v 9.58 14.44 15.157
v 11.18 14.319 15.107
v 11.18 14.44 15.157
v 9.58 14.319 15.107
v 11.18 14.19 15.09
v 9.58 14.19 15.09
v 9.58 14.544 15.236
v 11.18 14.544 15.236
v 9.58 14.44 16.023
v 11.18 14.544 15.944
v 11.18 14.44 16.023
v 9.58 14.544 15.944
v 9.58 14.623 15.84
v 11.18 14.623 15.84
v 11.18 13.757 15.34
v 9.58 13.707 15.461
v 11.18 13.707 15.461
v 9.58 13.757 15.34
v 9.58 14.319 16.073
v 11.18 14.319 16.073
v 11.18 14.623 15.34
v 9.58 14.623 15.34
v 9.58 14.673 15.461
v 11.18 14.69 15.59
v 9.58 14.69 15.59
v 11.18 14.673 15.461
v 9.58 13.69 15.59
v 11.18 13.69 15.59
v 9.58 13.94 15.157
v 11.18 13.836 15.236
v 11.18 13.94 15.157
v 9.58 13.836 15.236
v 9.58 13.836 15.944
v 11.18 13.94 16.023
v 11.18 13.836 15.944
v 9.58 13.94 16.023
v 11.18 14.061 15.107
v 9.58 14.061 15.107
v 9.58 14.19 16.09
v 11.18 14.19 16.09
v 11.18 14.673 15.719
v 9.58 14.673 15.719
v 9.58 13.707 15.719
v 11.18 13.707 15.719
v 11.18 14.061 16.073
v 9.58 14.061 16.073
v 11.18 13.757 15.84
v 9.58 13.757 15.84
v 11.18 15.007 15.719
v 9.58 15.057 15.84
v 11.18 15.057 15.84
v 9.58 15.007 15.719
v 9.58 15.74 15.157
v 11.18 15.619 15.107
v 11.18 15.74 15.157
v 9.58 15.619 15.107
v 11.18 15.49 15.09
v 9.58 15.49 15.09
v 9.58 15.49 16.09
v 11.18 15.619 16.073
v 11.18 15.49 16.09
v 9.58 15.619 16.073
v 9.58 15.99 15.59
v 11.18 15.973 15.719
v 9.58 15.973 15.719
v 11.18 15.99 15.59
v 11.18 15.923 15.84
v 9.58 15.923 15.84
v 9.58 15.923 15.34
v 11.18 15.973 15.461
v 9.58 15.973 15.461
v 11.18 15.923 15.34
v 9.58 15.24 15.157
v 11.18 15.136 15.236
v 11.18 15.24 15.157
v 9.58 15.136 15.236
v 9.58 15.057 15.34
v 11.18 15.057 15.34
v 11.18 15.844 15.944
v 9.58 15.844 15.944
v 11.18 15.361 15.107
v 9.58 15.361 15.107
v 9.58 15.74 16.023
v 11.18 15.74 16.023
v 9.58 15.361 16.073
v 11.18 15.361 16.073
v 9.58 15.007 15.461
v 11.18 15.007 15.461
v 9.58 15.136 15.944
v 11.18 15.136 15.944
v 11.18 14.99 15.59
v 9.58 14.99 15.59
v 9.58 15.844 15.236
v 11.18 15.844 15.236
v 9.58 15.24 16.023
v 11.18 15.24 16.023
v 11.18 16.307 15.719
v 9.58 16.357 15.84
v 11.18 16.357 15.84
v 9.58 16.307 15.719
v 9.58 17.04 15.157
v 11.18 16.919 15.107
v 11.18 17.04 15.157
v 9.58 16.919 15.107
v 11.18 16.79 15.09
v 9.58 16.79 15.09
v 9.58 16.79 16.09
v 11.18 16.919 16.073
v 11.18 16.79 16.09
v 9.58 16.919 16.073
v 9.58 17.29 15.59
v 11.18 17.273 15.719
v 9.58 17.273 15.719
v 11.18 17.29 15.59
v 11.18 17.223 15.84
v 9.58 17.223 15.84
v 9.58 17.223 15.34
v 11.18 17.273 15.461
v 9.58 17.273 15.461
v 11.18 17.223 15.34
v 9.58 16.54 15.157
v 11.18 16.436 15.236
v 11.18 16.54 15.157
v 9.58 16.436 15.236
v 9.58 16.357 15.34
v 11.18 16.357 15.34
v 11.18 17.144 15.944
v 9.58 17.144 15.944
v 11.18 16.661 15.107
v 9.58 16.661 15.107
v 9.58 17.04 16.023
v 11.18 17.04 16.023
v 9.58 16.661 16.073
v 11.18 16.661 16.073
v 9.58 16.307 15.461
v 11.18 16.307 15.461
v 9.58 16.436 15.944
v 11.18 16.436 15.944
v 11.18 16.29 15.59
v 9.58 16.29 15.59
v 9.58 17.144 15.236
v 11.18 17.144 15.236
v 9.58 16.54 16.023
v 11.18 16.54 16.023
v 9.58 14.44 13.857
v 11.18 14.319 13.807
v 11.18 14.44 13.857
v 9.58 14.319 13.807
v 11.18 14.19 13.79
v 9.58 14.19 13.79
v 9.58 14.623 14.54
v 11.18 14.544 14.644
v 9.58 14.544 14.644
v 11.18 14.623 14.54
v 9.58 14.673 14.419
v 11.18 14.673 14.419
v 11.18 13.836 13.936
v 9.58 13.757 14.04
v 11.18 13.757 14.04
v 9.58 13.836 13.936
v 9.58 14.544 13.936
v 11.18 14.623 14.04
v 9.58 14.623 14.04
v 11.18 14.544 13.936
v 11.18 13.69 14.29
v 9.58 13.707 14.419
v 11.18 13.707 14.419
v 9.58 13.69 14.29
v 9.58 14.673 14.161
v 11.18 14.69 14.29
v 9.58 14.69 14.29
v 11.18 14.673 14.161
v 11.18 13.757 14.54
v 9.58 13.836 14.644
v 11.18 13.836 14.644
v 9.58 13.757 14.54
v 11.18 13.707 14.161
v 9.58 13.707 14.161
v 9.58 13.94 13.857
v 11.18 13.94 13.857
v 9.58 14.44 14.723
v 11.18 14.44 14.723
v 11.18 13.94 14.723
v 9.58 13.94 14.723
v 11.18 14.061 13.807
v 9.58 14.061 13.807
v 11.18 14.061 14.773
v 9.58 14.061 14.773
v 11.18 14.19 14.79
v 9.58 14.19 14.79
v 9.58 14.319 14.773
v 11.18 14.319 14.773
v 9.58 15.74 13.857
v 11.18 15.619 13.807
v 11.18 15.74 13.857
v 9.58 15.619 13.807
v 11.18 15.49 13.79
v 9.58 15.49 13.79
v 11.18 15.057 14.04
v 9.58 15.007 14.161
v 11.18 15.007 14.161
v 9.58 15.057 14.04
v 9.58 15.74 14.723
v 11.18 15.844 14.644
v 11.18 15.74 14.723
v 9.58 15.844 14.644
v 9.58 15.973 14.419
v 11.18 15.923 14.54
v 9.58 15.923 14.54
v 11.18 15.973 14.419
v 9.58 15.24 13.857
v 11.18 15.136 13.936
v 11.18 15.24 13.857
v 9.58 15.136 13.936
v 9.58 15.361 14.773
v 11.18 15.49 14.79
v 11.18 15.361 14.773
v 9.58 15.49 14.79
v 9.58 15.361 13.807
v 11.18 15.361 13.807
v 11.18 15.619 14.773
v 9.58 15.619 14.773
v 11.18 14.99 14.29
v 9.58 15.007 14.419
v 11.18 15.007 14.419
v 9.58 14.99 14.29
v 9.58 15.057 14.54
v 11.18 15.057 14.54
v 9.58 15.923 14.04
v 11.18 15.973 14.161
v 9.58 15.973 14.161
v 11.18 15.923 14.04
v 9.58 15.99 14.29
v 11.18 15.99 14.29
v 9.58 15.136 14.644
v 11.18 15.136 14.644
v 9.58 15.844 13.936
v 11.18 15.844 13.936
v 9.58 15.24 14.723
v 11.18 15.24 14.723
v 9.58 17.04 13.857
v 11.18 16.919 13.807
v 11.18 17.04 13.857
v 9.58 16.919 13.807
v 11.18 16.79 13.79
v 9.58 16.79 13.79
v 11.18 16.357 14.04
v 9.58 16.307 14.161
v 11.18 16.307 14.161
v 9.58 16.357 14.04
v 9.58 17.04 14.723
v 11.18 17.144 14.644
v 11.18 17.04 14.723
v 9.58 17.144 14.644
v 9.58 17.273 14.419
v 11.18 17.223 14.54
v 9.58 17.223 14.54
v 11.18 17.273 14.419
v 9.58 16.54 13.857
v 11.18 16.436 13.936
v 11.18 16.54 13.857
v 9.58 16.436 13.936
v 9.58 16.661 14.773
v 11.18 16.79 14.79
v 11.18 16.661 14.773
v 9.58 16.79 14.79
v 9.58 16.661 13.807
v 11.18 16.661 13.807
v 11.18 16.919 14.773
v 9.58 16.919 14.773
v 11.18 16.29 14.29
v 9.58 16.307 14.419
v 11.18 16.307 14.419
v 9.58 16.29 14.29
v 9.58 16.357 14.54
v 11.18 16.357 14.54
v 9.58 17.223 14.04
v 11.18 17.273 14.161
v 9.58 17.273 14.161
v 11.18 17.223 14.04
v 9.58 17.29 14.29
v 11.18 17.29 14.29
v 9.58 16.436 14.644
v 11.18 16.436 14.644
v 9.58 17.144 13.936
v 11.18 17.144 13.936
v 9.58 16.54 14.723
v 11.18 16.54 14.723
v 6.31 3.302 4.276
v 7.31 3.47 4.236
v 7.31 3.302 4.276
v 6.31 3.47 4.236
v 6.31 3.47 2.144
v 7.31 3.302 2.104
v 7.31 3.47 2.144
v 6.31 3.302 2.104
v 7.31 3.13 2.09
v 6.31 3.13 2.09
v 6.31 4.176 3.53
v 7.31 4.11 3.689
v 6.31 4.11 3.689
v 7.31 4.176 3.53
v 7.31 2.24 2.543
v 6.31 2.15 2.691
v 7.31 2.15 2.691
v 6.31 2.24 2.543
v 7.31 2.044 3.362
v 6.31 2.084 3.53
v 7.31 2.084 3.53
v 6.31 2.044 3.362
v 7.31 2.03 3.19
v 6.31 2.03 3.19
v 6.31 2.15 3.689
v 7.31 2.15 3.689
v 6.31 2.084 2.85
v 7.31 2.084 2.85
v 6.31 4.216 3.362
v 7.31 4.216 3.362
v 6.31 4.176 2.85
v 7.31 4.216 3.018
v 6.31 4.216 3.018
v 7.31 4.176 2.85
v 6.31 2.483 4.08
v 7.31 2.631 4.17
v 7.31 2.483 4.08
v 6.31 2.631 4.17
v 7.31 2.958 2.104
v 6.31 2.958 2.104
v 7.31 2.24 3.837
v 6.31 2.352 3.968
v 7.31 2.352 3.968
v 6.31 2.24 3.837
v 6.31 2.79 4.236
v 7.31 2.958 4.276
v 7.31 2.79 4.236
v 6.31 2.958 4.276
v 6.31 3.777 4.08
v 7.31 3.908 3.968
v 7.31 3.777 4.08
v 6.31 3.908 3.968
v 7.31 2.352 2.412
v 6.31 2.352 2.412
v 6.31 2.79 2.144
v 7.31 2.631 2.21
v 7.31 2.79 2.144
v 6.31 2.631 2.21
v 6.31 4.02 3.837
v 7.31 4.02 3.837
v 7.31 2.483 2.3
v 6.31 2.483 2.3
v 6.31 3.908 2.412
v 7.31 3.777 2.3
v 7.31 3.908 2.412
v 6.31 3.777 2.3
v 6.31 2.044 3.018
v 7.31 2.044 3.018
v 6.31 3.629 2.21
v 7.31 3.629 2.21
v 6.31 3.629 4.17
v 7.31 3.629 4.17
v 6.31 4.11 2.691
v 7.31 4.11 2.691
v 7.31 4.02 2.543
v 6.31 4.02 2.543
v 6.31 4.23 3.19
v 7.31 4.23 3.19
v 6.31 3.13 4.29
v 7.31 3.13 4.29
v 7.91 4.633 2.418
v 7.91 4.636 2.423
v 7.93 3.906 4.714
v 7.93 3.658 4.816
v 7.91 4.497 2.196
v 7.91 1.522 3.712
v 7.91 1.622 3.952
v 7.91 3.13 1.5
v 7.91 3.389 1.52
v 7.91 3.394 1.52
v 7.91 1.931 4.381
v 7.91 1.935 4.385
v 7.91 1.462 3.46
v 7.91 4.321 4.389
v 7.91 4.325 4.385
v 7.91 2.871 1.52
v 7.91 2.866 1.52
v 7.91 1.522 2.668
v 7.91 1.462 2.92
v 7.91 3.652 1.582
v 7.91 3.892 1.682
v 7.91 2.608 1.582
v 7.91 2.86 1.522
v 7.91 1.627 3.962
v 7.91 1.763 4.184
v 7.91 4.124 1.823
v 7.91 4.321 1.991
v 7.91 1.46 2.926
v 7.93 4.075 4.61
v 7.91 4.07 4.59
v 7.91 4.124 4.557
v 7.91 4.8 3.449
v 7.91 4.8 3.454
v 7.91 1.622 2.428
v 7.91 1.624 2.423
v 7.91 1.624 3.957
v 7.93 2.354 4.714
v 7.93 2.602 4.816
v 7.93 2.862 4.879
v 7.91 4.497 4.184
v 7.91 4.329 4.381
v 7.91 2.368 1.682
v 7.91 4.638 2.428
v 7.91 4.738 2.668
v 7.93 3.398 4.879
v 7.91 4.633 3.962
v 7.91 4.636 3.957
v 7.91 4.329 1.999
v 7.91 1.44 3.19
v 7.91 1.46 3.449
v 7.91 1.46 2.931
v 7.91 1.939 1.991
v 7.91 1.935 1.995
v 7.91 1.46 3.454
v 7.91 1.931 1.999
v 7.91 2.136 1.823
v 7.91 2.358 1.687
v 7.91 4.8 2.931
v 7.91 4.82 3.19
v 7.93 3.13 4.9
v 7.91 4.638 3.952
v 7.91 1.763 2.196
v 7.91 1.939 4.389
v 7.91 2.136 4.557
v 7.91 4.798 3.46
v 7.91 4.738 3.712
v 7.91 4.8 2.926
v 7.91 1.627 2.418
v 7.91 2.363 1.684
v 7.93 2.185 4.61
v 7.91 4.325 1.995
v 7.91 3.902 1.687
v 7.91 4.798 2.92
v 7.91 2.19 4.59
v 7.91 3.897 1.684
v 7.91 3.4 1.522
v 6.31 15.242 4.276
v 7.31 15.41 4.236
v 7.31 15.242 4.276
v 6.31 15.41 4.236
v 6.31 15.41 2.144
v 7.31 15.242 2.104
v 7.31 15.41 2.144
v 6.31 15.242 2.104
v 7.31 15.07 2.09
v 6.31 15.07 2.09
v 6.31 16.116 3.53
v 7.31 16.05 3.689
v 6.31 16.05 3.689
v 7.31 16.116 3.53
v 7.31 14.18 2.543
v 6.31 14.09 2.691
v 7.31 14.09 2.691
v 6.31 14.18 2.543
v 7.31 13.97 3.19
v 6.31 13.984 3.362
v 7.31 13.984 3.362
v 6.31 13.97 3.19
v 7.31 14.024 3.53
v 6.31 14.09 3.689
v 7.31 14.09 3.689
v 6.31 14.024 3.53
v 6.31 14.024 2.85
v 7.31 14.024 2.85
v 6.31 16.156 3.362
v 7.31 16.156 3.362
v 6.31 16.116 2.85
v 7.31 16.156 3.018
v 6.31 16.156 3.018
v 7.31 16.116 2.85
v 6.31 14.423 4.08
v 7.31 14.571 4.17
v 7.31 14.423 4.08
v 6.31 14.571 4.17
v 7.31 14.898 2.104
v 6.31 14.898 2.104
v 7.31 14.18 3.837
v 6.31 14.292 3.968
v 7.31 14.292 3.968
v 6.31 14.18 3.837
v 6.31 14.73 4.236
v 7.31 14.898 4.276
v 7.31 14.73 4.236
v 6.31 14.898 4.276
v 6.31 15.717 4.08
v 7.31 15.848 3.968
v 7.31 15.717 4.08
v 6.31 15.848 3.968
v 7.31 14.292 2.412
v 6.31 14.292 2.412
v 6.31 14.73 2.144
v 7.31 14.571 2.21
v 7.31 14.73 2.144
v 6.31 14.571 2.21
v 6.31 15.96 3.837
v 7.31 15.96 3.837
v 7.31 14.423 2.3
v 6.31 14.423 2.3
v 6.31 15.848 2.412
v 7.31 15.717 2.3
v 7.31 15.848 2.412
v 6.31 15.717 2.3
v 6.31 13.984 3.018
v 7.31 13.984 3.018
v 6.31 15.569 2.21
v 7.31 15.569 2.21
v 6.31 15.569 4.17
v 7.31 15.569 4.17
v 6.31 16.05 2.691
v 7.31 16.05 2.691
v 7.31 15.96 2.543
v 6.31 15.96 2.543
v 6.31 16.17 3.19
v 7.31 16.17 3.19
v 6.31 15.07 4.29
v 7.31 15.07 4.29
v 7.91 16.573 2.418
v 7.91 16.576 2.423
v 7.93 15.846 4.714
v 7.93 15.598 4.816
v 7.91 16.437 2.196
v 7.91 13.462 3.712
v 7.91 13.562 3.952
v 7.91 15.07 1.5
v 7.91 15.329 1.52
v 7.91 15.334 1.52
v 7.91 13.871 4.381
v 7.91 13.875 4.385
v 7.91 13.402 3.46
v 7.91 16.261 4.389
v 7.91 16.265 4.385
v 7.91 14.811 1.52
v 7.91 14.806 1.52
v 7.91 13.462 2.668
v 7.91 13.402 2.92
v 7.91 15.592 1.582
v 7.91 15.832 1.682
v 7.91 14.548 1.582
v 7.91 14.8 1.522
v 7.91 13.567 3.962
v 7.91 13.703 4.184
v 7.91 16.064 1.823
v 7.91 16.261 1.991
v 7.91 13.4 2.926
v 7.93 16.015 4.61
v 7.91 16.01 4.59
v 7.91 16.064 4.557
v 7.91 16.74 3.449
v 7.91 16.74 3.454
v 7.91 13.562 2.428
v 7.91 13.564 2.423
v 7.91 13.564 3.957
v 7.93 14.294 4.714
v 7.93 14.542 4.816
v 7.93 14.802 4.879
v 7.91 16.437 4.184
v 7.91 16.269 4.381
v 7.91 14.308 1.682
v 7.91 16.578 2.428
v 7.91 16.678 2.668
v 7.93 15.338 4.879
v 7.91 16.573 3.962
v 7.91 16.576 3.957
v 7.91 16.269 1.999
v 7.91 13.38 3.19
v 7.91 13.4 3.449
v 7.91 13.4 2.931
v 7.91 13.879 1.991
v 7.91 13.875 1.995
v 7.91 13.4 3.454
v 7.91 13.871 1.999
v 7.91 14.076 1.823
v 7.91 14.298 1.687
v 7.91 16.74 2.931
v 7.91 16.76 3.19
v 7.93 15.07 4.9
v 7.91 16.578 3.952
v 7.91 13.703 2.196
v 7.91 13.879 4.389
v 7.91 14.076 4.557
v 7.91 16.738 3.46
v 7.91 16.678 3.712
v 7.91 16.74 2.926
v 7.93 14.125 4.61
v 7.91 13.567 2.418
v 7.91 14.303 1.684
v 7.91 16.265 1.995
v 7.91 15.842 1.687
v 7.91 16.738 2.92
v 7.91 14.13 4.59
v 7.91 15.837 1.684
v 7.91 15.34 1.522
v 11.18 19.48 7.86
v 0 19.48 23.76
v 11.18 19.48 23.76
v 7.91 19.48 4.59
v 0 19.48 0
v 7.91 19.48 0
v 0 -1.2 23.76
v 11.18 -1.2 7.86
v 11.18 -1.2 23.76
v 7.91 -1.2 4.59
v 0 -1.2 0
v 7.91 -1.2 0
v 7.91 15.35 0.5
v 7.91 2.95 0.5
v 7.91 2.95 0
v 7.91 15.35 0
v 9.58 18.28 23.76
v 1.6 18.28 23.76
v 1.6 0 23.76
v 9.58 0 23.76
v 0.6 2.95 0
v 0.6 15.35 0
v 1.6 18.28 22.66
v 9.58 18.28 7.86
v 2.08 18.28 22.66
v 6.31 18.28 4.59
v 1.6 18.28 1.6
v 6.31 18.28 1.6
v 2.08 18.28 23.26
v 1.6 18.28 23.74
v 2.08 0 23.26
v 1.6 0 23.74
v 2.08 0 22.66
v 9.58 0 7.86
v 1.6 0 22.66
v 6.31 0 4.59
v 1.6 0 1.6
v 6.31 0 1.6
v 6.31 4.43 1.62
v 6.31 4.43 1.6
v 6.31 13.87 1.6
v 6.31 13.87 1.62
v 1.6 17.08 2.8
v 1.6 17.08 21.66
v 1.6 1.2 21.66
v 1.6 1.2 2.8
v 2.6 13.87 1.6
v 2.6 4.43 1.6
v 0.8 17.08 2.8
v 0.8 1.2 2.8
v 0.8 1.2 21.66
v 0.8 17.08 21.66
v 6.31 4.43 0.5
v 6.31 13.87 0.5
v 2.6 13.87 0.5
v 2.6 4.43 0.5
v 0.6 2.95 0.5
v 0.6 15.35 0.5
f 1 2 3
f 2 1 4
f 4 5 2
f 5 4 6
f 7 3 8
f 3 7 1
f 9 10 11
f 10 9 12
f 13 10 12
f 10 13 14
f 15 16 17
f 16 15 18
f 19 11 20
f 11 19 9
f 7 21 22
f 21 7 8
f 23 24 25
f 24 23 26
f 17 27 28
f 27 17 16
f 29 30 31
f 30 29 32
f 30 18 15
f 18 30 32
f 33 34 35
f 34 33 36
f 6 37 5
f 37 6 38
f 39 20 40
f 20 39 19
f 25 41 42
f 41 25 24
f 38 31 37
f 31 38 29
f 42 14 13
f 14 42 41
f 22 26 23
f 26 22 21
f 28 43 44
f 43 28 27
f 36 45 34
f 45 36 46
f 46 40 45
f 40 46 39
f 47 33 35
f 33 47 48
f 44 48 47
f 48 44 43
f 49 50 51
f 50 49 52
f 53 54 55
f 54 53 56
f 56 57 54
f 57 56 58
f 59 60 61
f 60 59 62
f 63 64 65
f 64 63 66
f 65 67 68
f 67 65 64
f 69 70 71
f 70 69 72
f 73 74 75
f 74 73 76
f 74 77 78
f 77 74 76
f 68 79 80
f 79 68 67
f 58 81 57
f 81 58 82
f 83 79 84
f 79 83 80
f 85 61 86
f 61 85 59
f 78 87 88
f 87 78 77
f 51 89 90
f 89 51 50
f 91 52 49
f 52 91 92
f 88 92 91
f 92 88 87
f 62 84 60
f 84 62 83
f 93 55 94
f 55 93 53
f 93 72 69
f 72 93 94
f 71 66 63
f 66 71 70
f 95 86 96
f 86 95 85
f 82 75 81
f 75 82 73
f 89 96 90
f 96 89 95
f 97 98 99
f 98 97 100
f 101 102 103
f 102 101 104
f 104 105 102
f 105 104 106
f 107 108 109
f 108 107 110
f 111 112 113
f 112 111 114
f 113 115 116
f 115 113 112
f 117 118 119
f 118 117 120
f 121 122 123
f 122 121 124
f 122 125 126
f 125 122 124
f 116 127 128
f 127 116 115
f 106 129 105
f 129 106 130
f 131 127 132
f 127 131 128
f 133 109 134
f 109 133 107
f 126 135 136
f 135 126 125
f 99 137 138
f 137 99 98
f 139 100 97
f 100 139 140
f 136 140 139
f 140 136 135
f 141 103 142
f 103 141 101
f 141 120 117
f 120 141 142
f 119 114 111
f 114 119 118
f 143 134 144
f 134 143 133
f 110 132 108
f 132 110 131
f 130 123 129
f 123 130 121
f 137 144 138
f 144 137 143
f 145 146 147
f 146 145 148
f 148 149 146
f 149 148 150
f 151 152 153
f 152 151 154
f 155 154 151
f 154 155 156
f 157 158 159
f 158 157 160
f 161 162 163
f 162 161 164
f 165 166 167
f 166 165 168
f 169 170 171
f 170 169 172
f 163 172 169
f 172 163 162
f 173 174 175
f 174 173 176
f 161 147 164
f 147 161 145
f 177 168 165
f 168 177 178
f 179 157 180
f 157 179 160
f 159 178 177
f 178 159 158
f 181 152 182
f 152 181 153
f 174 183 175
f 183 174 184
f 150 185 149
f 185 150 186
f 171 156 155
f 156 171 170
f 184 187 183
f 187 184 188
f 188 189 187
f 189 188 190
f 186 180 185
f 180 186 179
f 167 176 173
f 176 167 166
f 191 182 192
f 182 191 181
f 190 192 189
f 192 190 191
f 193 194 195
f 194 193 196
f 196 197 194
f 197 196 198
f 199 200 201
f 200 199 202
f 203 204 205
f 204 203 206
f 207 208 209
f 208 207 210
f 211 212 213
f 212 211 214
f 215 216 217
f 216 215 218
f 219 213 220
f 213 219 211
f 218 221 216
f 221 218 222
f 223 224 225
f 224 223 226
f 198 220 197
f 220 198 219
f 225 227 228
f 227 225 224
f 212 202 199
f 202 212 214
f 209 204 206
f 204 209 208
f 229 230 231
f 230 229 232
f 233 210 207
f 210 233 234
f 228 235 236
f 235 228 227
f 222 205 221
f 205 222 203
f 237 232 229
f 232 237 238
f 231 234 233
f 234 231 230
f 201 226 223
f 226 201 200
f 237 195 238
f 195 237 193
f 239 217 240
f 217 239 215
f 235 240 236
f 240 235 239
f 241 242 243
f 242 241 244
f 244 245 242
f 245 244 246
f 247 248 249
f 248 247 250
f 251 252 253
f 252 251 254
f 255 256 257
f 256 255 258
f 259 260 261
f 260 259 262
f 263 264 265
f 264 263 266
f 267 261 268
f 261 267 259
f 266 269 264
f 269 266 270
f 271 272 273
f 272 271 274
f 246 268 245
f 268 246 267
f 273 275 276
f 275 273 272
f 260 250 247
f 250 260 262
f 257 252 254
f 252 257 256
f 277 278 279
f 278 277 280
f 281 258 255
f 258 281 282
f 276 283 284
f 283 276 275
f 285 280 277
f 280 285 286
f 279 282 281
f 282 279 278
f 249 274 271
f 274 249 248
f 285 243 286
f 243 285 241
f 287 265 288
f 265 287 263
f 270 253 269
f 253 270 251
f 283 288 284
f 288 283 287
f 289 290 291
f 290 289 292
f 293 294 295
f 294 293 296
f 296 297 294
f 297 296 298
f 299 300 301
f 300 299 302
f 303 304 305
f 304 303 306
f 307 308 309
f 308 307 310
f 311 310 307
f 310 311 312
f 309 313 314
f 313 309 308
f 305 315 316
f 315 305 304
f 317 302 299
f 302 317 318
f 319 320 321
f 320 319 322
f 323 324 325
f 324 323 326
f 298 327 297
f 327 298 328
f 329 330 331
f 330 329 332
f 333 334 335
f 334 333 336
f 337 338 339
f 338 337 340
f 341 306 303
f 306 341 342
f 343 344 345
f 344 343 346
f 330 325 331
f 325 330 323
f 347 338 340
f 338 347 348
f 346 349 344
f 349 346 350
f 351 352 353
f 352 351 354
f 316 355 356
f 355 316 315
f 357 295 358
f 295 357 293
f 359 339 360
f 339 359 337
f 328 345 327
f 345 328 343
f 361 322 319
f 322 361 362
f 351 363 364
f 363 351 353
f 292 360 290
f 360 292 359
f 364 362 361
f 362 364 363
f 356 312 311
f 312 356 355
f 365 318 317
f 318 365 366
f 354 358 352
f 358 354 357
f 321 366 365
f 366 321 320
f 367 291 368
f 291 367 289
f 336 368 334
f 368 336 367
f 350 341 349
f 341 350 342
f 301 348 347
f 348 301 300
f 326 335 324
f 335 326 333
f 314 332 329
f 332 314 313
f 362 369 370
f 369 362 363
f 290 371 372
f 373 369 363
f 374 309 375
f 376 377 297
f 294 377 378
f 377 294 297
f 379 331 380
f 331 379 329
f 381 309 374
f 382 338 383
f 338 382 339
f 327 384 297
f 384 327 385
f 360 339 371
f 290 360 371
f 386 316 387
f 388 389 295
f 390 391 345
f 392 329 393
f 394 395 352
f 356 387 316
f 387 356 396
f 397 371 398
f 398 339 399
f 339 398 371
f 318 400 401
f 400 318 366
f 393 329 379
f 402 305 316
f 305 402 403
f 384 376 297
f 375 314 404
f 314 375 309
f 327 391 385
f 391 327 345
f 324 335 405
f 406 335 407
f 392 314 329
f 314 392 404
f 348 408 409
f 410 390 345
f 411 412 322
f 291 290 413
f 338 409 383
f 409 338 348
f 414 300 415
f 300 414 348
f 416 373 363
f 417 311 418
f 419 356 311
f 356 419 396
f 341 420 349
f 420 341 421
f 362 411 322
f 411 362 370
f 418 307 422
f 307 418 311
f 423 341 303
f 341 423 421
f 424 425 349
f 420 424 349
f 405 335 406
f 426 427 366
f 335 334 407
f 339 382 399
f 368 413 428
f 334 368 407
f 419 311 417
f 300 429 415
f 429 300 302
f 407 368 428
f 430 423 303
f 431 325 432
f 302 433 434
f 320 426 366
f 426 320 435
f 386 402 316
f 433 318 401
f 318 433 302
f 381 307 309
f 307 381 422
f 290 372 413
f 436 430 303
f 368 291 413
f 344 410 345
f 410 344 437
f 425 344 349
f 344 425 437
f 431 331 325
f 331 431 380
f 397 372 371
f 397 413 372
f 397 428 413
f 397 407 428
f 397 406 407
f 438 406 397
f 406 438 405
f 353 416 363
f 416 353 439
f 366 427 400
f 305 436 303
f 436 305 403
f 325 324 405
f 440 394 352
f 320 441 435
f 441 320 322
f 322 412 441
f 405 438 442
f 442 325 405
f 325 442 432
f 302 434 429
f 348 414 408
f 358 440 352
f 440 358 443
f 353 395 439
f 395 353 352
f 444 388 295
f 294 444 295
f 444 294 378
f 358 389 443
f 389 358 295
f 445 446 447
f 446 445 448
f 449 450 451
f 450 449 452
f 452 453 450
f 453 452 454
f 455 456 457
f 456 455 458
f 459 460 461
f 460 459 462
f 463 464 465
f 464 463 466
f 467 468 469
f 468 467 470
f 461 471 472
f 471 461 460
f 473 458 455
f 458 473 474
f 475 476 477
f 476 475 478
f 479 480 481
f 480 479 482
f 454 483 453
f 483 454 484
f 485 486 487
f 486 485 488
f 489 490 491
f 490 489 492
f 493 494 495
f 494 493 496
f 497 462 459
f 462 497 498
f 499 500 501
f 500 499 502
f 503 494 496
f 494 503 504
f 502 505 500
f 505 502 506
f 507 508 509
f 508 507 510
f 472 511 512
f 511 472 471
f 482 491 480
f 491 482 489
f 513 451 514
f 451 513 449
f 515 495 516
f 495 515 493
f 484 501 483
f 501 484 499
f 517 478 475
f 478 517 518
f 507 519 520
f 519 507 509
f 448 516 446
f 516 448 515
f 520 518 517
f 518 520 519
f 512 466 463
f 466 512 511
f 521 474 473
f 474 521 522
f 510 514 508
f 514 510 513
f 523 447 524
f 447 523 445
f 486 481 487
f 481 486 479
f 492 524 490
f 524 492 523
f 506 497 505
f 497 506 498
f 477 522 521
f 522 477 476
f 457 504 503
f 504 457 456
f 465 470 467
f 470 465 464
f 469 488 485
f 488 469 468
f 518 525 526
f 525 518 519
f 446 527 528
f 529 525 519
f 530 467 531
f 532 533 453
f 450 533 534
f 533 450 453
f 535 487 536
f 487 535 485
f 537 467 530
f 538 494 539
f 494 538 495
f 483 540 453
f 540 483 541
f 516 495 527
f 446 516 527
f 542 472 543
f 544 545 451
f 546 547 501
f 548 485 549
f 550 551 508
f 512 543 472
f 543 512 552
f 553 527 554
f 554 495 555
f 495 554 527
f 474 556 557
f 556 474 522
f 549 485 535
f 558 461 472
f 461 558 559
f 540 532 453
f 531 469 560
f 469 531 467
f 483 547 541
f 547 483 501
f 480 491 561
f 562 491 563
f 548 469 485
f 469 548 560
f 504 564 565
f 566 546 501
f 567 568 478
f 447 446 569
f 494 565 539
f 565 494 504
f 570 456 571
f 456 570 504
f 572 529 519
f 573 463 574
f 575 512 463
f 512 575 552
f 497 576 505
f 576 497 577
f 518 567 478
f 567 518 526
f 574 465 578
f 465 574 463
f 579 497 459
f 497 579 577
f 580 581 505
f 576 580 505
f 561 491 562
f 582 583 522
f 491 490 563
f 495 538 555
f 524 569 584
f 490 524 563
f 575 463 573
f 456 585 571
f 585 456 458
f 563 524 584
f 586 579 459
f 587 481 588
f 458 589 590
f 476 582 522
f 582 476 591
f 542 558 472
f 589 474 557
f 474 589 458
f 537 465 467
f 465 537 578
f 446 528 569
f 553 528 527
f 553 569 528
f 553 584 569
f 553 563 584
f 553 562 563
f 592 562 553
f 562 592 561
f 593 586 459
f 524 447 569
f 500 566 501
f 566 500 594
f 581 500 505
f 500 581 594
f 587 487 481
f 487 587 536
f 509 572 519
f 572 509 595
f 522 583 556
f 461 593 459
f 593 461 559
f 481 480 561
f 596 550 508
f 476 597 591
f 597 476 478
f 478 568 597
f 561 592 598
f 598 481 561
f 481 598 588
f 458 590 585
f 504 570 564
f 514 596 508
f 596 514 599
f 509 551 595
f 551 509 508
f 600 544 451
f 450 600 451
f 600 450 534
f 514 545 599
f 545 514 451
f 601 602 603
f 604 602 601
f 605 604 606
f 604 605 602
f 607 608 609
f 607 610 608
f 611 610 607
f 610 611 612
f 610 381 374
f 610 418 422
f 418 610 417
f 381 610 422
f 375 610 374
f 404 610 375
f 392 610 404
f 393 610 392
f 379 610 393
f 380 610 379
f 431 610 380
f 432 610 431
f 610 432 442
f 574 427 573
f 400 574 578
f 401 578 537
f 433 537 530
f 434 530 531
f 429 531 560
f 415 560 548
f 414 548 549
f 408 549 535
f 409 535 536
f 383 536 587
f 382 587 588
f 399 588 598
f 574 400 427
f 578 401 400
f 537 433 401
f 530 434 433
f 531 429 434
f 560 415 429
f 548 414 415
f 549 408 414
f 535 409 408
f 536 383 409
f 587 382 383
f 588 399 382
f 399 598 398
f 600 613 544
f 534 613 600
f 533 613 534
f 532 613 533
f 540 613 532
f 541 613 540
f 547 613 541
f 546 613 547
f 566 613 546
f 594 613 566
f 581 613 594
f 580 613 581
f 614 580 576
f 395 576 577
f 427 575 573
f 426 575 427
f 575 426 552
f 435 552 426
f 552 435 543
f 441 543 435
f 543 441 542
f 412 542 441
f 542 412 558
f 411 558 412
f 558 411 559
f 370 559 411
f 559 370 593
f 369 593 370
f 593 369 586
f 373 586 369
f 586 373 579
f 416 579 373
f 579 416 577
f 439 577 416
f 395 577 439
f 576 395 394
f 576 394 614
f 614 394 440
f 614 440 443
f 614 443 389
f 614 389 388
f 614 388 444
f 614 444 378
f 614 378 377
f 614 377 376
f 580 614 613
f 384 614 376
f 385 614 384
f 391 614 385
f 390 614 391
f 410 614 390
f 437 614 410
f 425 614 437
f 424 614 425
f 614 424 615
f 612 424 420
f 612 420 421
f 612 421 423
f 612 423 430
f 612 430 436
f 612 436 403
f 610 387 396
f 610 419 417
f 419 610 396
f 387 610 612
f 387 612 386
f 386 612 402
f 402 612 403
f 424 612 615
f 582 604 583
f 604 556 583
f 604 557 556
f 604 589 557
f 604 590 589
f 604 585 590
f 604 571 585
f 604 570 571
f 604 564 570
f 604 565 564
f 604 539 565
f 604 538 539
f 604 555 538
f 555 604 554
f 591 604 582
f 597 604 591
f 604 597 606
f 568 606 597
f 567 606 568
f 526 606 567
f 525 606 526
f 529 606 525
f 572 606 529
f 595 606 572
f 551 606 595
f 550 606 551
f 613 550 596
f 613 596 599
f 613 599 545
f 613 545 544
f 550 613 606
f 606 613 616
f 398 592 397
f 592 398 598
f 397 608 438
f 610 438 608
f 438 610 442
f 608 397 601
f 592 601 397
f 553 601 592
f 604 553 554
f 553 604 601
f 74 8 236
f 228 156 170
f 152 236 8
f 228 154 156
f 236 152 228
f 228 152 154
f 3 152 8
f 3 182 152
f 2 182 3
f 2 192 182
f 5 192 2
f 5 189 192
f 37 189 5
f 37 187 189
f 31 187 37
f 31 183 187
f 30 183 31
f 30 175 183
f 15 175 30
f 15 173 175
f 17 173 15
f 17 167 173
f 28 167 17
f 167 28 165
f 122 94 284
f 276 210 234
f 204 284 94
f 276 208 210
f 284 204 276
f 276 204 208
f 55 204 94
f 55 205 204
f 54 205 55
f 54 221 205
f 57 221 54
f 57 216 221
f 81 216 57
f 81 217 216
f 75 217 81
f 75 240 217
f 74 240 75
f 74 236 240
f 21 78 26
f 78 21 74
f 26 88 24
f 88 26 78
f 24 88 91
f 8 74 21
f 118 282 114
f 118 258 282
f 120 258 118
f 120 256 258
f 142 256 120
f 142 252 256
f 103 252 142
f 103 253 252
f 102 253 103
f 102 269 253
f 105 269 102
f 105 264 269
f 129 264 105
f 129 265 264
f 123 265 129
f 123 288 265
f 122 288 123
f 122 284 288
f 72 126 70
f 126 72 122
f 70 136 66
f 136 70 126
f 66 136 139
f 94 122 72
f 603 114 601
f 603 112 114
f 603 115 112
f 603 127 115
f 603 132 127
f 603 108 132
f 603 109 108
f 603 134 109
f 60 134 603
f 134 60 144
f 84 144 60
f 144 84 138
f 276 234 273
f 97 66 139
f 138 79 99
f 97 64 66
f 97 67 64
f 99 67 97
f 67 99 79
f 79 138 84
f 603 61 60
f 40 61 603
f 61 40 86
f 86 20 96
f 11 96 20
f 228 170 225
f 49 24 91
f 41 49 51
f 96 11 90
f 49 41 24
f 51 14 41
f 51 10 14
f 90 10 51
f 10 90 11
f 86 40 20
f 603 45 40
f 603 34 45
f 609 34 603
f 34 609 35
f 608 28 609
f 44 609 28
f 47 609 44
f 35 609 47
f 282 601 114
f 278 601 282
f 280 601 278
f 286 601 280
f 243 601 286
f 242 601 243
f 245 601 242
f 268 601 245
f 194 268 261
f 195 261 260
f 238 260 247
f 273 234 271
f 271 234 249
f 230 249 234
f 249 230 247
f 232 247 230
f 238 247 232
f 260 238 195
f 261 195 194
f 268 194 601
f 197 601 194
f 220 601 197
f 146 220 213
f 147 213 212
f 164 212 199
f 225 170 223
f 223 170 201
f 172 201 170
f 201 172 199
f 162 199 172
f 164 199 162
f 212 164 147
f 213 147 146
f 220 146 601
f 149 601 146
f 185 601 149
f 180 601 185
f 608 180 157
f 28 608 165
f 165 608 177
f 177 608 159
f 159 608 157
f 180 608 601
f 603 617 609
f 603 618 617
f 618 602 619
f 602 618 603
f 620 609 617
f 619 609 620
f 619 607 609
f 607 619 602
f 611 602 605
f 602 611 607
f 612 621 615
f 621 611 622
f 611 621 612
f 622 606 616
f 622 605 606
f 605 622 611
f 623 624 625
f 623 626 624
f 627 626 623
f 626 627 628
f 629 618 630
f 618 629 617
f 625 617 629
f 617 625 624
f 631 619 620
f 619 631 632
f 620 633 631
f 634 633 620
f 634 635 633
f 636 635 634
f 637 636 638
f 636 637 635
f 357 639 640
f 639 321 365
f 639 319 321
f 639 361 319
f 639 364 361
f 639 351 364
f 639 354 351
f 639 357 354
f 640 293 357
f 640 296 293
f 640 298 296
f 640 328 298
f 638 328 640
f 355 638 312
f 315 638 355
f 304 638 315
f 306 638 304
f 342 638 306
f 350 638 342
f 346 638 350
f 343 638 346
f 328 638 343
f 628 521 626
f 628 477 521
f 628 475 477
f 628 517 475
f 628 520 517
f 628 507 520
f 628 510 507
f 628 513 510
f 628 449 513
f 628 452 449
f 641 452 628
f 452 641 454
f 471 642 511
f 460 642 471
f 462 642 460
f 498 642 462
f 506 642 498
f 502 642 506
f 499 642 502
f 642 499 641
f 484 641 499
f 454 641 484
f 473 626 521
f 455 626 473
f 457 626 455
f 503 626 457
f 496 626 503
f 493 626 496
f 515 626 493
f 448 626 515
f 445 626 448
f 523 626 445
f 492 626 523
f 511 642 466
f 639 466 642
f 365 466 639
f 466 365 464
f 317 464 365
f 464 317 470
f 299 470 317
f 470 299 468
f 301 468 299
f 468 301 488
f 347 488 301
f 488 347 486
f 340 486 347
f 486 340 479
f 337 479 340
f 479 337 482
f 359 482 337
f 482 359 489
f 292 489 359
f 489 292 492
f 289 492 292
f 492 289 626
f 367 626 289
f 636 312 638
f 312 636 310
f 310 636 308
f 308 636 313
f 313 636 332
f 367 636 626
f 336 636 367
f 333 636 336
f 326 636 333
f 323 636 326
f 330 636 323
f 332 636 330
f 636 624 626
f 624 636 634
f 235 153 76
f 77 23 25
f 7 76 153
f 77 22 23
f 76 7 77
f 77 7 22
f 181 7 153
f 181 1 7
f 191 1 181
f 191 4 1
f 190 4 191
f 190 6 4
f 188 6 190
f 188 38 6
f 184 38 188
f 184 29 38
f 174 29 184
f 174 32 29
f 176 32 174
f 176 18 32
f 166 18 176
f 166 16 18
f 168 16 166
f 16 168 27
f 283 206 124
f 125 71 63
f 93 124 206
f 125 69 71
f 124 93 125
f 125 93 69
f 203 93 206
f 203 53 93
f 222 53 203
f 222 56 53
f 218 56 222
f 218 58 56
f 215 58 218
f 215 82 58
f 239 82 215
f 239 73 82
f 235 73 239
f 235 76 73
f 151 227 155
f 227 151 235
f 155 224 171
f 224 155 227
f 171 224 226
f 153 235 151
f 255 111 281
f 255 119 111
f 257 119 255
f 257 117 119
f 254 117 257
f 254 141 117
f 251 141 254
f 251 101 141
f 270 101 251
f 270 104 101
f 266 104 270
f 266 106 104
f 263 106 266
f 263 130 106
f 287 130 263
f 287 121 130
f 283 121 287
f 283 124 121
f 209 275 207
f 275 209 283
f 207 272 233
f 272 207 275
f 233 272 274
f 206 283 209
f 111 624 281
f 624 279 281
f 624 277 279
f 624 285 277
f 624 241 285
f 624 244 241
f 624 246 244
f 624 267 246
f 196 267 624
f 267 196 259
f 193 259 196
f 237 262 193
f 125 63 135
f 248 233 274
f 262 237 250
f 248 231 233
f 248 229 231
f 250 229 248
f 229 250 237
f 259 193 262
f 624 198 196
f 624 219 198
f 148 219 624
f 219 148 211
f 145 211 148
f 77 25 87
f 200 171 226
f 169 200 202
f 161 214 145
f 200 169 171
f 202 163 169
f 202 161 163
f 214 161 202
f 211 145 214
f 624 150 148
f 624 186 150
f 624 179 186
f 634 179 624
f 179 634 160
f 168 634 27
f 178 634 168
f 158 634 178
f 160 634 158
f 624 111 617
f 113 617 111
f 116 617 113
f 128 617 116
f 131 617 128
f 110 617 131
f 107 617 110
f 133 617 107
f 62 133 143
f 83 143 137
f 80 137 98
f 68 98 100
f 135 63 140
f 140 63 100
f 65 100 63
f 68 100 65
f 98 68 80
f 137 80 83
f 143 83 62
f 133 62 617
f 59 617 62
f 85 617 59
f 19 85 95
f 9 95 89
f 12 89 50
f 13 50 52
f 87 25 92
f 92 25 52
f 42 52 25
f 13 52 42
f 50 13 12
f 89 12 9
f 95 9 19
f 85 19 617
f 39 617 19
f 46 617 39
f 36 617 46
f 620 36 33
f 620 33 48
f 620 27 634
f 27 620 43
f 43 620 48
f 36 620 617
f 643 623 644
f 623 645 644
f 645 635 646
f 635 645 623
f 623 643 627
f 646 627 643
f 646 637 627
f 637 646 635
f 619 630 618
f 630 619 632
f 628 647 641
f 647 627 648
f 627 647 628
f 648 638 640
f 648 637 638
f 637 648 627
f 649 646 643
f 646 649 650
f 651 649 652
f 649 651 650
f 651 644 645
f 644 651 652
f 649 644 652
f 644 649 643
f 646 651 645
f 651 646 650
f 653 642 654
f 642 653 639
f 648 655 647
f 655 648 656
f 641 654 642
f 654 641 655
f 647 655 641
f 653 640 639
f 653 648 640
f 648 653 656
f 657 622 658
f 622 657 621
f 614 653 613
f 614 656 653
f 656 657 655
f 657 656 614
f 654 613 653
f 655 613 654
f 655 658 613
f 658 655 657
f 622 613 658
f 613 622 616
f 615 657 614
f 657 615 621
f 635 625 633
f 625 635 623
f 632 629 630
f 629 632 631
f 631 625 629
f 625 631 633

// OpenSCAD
// 2026-10-17 V7 SD-free recorder sleeve: one printed piece, no lid, no glue.
// Ryan: "just slide in from back no top at all to glue on, just a snug open
// back design". The XIAO + Sense stack slides in from the open back (the end
// away from USB-C) until the main board meets the front wall. A small floor
// detent at the open end and a snug side fit hold it. The roof is part of the
// sleeve and carries the mic grille and the B/R poke holes. Wires leave
// through the open back. (The zip-tie tab was removed on 2026-10-18: Ryan said
// it "just seems to get in the way". Set tie_tab = true to bring it back.)
// Board data: Seeed STEP model and Sense-board DXF (see V7-NOTES.md).
// Superseded two-part V7 draft: superseded-drafts/v7-two-part/.
part = "print"; // print, case, fit_preview, cutaway, top_view, collision

/* [Options] */
sd_socket_present = true; // false = socket desoldered: lower roof ahead of the FPC connector
side_gap = 0.25;  // per side. 0.25 = V6 width that gripped the board (snug);
                  // 0.45 = V6.4 width that dropped in freely
detent_h = 0.5;   // floor bump behind the main board; the stack lifts over it
roof_clear = 0.8; // above the tallest part that slides under each roof section

/* [Board, Seeed model] */
pcb_l = 20.96;
pcb_w = 17.78;
rear_slack = 0.3;           // room behind the main board for the detent
board_x0 = rear_slack;      // main board rear edge when pushed fully in
pl = pcb_l + rear_slack;    // 21.26, pocket length from the open end
pw = pcb_w + 2*side_gap;    // 18.28 by default

/* [Shell] */
wall = 1.6;        // front (USB) wall
side_wall = 1.2;   // 2026-10-18, Ryan: thinner sides. 3 lines with a 0.4 mm nozzle (was 1.6)
floor_t = 1.6;
roof_t = 1.6;
relief_depth = 0.8;   // centre relief under the board, as V6.x
x_rear = -0.9;        // open end, behind the detent ramp
x_front = pl + wall;
y0 = -side_wall;
y1 = pw + side_wall;

// STEP height -> case z, board resting on the floor.
function bz(h) = floor_t + h + 0.25;
// STEP x -> case x; STEP z -> case y.
function bx(x) = board_x0 + 8.67 + x;
function by(z) = side_gap + 2.78 - z;

fpc_top = bz(6.93);    // camera FPC connector (camera removed), tallest part
fpc_front = bx(-3.99); // its USB-side face, 4.98
slot_top = bz(6.77);   // microSD socket shell (dead, may be desoldered)
sense_comp_top = bz(6.19); // tallest small Sense part ahead of the FPC
sense_top = bz(5.18);
mic_top = sense_top + 0.98;
btn_top = bz(1.73);

// Roof heights. The FPC connector only travels under the rear section; the
// front section only has to pass the parts ahead of it.
roof_rear_under = fpc_top + roof_clear;
front_tallest = sd_socket_present ? max(slot_top, sense_comp_top, mic_top) : max(sense_comp_top, mic_top);
roof_front_under = max(front_tallest + roof_clear, sd_socket_present ? roof_rear_under : 0);
roof_step_x = 5.3;     // 0.3 mm ahead of the FPC connector
case_top = roof_rear_under + roof_t;

/* [USB-C] Receptacle in the Seeed model: 8.94 wide x 3.21 tall, sitting on the
   main board top (STEP height 1.00..4.21), sticking 1.53 mm past the board edge
   into the front wall. Nothing else ahead of the Sense board is taller than the
   B/R switches (1.73), so the roof drops over the USB end (Ryan, 2026-10-17). */
usb_y = by((-10.59-1.65)/2);  // receptacle centre
usb_clear = 0.25;             // per side, print tolerance
usb_width = 8.94 + 2*usb_clear;     // 9.44 window
usb_bottom = bz(1.00) - usb_clear;  // 2.60
usb_top = bz(4.21);                 // 6.06, receptacle top
roof_usb_under = usb_top + usb_clear; // 6.31, roof underside over the USB end
usb_step_x = bx(5.70) + 0.33;  // 15.0, just ahead of the Sense board's front edge
// 45-degree slope from the Sense-height roof down to the USB roof, so the part
// still prints USB face down with no supports.
usb_slope_end = usb_step_x + (roof_front_under - roof_usb_under);
// Cable overmold recess: outer 0.5 mm of the front wall, open to the top, so a
// plug's overmold can never land on the wall before the plug seats.
overmold_w = 12.4;
overmold_depth = 0.5;
overmold_bottom = 0.6;

/* [Strain relief tab, behind the floor; off since 2026-10-18] */
tie_tab = false;
tab_l = 5;
tab_w = 10;
tab_t = 1.6;
tie_slot = [2.8, 1.4];
tie_off = 3.4;

/* [Mic] Sense DXF: MIC 3.5 x 2.65 mm, centre 2.54 mm in from the D0 edge,
   7.62 mm from the main board's far end. */
mic_x = board_x0 + 7.62;
mic_y = side_gap + pcb_w - 2.54;
mic_len = [2.65, 3.5];
grille_d = 1.0;
grille_pitch = 1.3;
grille_n = [2, 3];
// No collar under the grille: the stack lifts by detent_h while sliding in, so
// a collar would have to stop above the socket anyway (V7 two-part had one).

/* [Buttons] B expected on the 5V/GND edge (-Y), R on the D0 edge (+Y). */
btn_x = bx(10.70);
btn_b_y = by(-0.10);
btn_r_y = by(-12.04);
btn_d = 2.2;
btn_sink = 3.4;

eps = 0.02;
$fn = 40;

function roof_under_at(x) = x < roof_step_x ? roof_rear_under
  : x < usb_step_x ? roof_front_under
  : x < usb_slope_end ? roof_front_under - (x - usb_step_x) : roof_usb_under;

// Side profile (x, z) of the roof underside from the open end to the front.
function ceiling_pts(xa, xb) = concat([[xb, roof_usb_under], [usb_slope_end, roof_usb_under],
  [usb_step_x, roof_front_under]],
  roof_front_under < roof_rear_under ? [[roof_step_x, roof_front_under], [roof_step_x, roof_rear_under]] : [],
  [[xa, roof_rear_under]]);
module profile_y(pts, ya, yb) // extrude an x-z polygon from y = ya to y = yb
  translate([0,yb,0]) rotate([90,0,0]) linear_extrude(yb-ya) polygon(pts);

module sleeve() {
  difference() {
    union() {
      // Outer shell: roof_t above the ceiling, low over the USB end.
      profile_y(concat([[x_rear,0],[x_front,0]],
        [for(p=ceiling_pts(x_rear,x_front)) [p[0], p[1]+roof_t]]), y0, y1);
      if(tie_tab) translate([x_rear-tab_l,(pw-tab_w)/2,0]) cube([tab_l+eps,tab_w,tab_t]);
    }
    // Tunnel, open at the rear end only.
    profile_y(concat([[x_rear-1,floor_t],[pl,floor_t]], ceiling_pts(x_rear-1,pl)), 0, pw);
    translate([1.2,1.2,floor_t-relief_depth]) cube([pl-2.4,pw-2.4,relief_depth+eps]);
    // USB-C window in the front wall, receptacle size plus usb_clear.
    translate([pl-eps,usb_y-usb_width/2,usb_bottom])
      cube([wall+2*eps,usb_width,roof_usb_under-usb_bottom]);
    // Overmold recess on the outside face.
    translate([x_front-overmold_depth,usb_y-overmold_w/2,overmold_bottom])
      cube([overmold_depth+eps,overmold_w,case_top]);
    // Tie slots.
    if(tie_tab) for(s=[-1,1])
      translate([x_rear-tab_l/2-tie_slot[0]/2,pw/2+s*tie_off-tie_slot[1]/2,-eps])
        cube([tie_slot[0],tie_slot[1],tab_t+2*eps]);
    // Mic grille.
    for(i=[0:grille_n[0]-1], j=[0:grille_n[1]-1])
      translate([mic_x+(i-(grille_n[0]-1)/2)*grille_pitch,
                 mic_y+(j-(grille_n[1]-1)/2)*grille_pitch,roof_under_at(mic_x)-0.5])
        cylinder(d=grille_d,h=case_top,$fn=24);
    // B / R poke holes with a lead-in on the outside.
    for(yy=[btn_b_y,btn_r_y]) translate([btn_x,yy,0]) {
      translate([0,0,roof_under_at(btn_x)-0.5]) cylinder(d=btn_d,h=case_top);
      translate([0,0,roof_under_at(btn_x)+roof_t-(btn_sink-btn_d)/2])
        cylinder(d1=btn_d,d2=btn_sink+0.02,h=(btn_sink-btn_d)/2+eps);
    }
  }
  // Floor detent behind the main board: 45-degree ramp from the open end,
  // square face toward the board so it can't creep back out.
  translate([0,0,floor_t-eps]) rotate([90,0,0]) translate([0,0,-pw])
    linear_extrude(pw) polygon([[x_rear,0],[x_rear+detent_h,detent_h],[board_x0-0.1,detent_h],[board_x0-0.1,0]]);
}

// Simplified board for previews and the collision check only.
module step_box(a,b,c,d,e,f) { translate([bx(a),by(f),bz(c)]) cube([b-a,f-e,d-c]); }
// tilt = rear edge raised by this much, pivoting on the main board's front
// bottom edge, as when the rear rides up the detent ramp.
// back = how far short of seated the board is while doing so.
module board(lift=0, tilt=0, back=0)
  translate([board_x0+pcb_l-back,0,floor_t]) rotate([0,atan(tilt/pcb_l),0])
  translate([-(board_x0+pcb_l),0,-floor_t+lift]) {
  color("seagreen") step_box(-8.67,12.28,-0.25,1,-15,2.78);     // XIAO
  color("seagreen") step_box(-8.97,5.70,3.93,5.18,-14.50,2.28);  // Sense
  color("silver") step_box(6.51,13.81,1.00,4.21,-10.59,-1.65);   // USB-C receptacle
  color("silver") step_box(-5.03,5.57,1,3,-12.41,0.19);          // RF shield
  color("ivory") step_box(-8.84,-3.99,5.17,6.93,-12.11,0.20);    // FPC connector
  color("lightgray") step_box(-2.21,-1.07,5.18,6.19,-9.75,-3.75); // small Sense part
  if(sd_socket_present) color("dimgray") step_box(0.30,5.70,5.18,6.77,-13.60,-0.30); // socket
  color("gold") translate([mic_x-mic_len[0]/2,mic_y-mic_len[1]/2,sense_top]) cube([mic_len[0],mic_len[1],0.98]);
  color("red") step_box(9.15,12.24,1.0,1.73,-1.0,0.6);           // B
  color("orange") step_box(9.15,12.24,1.0,1.73,-12.84,-11.24);   // R
}

if(part=="print") // front (USB) face down, open back up: no bridges, no supports
  translate([0,0,x_front]) rotate([0,90,0]) sleeve();
if(part=="case") color([0.25,0.45,0.7]) sleeve();
if(part=="fit_preview") { color([0.25,0.45,0.7,0.5]) sleeve(); board(); }
if(part=="cutaway") {
  color([0.25,0.45,0.7]) difference(){ sleeve(); translate([x_rear-10,-10,-1]) cube([60,usb_y+10,30]); }
  board();
}
if(part=="top_view") {
  board();
  color("black") difference() {
    translate([x_rear,y0,case_top]) cube([x_front-x_rear,y1-y0,0.1]);
    translate([x_rear+0.3,y0+0.3,case_top-1]) cube([x_front-x_rear-0.6,y1-y0-0.6,2]);
  }
  color("blue") for(i=[0:grille_n[0]-1], j=[0:grille_n[1]-1])
    translate([mic_x+(i-(grille_n[0]-1)/2)*grille_pitch,mic_y+(j-(grille_n[1]-1)/2)*grille_pitch,mic_top])
      cylinder(d=grille_d,h=case_top-mic_top,$fn=24);
  color("blue") for(yy=[btn_b_y,btn_r_y]) translate([btn_x,yy,btn_top])
    difference(){ cylinder(d=btn_d,h=case_top-btn_top); translate([0,0,-1]) cylinder(d=btn_d-0.4,h=20); }
}
if(part=="collision") {
  intersection(){ sleeve(); board(); }       // seated
  // Riding over the detent: the rear tips up by detent_h on the front edge.
  // (A straight 0.5 mm lift would no longer pass: the USB roof is 0.25 mm over
  // the receptacle.) Each part only ever slides under roof it later sits under.
  // The rear edge is at the top of the ramp, 0.7 mm short of seated.
  intersection(){ sleeve(); board(tilt=detent_h, back=board_x0-(x_rear+detent_h)); }
}
